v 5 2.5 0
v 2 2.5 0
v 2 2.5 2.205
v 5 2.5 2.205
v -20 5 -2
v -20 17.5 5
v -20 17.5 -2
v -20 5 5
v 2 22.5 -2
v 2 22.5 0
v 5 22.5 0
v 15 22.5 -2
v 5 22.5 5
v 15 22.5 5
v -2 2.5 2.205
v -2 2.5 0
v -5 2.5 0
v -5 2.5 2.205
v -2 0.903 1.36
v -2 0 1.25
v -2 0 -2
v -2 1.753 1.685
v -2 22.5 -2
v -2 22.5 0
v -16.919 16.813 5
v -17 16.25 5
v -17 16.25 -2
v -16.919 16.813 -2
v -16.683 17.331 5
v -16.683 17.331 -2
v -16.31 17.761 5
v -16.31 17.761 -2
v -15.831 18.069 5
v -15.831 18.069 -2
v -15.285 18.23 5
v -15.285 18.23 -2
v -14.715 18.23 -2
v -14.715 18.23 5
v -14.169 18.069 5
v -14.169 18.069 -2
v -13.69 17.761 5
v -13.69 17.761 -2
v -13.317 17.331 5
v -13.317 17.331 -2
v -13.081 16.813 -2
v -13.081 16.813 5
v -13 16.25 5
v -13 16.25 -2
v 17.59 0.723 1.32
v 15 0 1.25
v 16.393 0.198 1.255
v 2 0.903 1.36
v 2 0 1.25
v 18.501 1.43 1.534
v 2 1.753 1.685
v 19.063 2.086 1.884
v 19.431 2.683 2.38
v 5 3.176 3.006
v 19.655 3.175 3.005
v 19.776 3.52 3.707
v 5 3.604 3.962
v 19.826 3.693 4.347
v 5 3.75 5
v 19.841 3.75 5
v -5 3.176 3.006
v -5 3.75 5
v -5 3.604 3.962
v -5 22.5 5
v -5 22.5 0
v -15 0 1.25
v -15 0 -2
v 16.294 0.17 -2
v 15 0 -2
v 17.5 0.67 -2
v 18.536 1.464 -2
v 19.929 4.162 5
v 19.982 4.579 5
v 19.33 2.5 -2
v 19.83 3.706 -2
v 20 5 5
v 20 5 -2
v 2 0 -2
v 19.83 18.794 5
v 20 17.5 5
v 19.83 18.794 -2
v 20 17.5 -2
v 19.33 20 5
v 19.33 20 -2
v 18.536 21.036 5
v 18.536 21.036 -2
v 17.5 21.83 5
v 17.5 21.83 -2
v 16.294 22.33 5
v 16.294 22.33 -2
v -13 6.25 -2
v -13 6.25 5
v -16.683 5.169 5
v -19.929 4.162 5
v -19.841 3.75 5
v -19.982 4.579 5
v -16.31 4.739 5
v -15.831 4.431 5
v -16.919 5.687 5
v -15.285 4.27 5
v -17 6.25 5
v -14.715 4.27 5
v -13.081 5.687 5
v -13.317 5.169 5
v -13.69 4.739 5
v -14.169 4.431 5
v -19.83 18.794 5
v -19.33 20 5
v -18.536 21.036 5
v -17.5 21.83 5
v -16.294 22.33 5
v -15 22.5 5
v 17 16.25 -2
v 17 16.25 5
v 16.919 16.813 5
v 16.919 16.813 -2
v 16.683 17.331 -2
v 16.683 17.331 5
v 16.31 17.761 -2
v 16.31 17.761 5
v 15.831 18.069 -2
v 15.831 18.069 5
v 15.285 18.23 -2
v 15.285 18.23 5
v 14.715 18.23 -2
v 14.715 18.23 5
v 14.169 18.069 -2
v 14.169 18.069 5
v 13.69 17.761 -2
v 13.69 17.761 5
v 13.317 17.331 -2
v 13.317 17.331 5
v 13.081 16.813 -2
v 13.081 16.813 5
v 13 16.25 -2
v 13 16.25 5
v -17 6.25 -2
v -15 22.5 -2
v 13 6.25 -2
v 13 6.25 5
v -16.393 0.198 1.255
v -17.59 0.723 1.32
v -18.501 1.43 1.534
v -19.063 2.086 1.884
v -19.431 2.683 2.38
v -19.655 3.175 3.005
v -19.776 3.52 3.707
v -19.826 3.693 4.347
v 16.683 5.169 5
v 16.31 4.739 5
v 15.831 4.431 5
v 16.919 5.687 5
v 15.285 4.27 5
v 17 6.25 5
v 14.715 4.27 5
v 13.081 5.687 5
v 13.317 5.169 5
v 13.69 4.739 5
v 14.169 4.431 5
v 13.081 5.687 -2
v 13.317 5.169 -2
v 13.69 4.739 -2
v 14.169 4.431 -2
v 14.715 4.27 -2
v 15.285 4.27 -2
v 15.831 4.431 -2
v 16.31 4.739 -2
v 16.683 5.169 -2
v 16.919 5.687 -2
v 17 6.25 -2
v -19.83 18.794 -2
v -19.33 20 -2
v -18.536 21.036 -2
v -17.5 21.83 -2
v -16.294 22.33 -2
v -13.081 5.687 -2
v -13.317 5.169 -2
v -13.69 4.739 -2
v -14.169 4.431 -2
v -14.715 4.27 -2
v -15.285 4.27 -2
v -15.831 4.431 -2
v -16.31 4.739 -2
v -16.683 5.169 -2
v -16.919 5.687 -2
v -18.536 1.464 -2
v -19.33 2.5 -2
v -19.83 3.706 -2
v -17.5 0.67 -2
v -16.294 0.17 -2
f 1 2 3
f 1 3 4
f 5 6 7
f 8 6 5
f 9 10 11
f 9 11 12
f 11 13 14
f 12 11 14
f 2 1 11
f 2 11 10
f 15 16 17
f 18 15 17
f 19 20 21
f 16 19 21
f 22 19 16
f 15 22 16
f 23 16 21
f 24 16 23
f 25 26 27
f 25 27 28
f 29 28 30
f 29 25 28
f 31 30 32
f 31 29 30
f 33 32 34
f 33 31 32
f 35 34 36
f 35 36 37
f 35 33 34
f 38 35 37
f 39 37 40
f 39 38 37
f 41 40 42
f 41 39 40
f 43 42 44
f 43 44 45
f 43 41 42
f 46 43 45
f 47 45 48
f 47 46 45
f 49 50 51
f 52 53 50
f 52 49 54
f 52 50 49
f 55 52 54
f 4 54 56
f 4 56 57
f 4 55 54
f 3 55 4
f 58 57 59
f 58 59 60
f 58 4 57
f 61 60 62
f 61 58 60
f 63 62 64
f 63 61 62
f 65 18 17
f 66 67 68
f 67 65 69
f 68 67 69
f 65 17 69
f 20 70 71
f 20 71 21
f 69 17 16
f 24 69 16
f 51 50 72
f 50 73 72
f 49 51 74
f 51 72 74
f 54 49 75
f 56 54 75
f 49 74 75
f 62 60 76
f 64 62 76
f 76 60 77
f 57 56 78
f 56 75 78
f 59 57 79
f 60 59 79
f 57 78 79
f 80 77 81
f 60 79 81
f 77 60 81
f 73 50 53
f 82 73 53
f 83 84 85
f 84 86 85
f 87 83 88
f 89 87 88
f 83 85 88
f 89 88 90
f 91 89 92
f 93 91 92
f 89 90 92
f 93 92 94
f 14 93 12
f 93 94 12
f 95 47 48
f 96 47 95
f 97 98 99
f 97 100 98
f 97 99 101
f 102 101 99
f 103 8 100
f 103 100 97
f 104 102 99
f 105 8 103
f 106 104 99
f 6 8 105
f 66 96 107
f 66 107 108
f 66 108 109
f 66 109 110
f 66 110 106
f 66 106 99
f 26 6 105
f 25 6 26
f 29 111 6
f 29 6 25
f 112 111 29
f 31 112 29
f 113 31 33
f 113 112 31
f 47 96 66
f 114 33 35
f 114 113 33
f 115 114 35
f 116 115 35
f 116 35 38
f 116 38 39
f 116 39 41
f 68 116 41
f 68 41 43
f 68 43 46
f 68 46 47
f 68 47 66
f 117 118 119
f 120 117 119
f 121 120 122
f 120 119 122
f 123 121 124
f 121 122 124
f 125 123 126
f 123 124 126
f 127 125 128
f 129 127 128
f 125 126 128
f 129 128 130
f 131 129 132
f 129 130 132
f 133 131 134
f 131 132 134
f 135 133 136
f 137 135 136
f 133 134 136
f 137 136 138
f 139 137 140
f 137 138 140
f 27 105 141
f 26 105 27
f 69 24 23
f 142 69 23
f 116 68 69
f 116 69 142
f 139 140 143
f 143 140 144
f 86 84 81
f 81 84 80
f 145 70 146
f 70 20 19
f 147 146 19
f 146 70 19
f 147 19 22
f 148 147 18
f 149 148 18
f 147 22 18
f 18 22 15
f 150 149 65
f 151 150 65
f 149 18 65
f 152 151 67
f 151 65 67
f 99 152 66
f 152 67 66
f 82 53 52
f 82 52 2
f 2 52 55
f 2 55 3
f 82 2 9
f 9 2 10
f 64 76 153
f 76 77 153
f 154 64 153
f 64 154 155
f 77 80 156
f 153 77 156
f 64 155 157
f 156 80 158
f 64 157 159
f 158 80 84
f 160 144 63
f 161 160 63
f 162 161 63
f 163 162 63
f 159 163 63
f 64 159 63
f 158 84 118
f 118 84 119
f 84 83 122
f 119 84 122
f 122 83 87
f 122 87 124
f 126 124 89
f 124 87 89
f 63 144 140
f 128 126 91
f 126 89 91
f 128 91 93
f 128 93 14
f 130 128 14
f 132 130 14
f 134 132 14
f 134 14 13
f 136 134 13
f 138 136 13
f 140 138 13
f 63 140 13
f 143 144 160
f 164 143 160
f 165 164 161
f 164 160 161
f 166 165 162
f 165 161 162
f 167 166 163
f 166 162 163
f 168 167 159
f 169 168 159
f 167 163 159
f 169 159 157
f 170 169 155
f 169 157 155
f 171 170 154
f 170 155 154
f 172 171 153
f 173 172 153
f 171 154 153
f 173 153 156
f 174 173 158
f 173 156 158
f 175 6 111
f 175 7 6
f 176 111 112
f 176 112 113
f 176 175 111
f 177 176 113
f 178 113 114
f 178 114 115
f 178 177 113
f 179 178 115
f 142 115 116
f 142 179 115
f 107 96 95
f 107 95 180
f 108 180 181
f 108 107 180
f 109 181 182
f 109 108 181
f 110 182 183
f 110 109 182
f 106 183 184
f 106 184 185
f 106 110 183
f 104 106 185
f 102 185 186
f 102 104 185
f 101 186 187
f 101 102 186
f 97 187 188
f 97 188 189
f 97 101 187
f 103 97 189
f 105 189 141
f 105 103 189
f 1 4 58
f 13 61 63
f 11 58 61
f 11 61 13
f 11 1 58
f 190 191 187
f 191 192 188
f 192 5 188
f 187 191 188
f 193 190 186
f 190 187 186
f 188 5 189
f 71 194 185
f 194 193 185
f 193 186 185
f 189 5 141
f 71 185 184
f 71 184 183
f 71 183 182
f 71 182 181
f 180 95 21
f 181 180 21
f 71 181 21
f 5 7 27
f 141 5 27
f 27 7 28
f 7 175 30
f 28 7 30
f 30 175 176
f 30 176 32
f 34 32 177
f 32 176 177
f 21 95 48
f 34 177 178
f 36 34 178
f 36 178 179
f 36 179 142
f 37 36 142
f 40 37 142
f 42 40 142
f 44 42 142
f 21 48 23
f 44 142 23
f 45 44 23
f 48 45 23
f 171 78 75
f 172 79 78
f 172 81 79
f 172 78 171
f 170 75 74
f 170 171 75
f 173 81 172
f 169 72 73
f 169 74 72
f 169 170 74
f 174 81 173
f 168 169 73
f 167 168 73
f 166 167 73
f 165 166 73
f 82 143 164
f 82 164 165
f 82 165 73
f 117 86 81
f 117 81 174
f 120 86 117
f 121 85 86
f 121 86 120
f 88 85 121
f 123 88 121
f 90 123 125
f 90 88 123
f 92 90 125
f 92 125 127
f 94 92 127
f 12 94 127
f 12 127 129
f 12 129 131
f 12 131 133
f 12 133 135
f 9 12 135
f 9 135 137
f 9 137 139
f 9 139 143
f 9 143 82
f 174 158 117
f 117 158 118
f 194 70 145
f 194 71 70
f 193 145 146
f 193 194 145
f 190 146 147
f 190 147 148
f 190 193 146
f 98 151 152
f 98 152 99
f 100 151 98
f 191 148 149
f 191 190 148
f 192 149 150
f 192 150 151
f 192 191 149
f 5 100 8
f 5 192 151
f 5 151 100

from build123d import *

# Parameters (mm, degrees)
F1_DEPTH = 5
F0_W     = 3
F0_H     = 20
F2_DEPTH = 2
F3_R     = 3.75
F4_DEPTH = 25
F5_R     = 5


with BuildPart() as f1:
    # F0 (on Top) → F1 (new body)
    with BuildSketch(Plane.XY):
        Polygon((-20, 0), (-2, 0), (-2, 2.5), (-5, 2.5), (-5, 22.5), (-15, 22.5), (-20, 22.5), align=None)
        with BuildLine():
            ThreePointArc((-17, 16.25), (-15, 18.25), (-13, 16.25))
            Line((-13, 16.25), (-13, 6.25))
            ThreePointArc((-13, 6.25), (-15, 4.25), (-17, 6.25))
            Line((-17, 6.25), (-17, 16.25))
        make_face(mode=Mode.SUBTRACT)
    extrude(amount=F1_DEPTH)

    # F0 (on Top) → F2 (join)
    with BuildSketch(Plane.XY):
        Polygon((-20, 0), (-2, 0), (-2, 2.5), (-5, 2.5), (-5, 22.5), (-15, 22.5), (-20, 22.5), align=None)
        with BuildLine():
            ThreePointArc((-17, 16.25), (-15, 18.25), (-13, 16.25))
            Line((-13, 16.25), (-13, 6.25))
            ThreePointArc((-13, 6.25), (-15, 4.25), (-17, 6.25))
            Line((-17, 6.25), (-17, 16.25))
        make_face(mode=Mode.SUBTRACT)
        with Locations((-3.5, 12.5)):
            Rectangle(F0_W, F0_H)
    extrude(amount=-F2_DEPTH)

    # F3 (on face) → F4 (cut)
    with BuildSketch(Plane.YZ.offset(-2)):
        with Locations((0, 5)):
            Circle(F3_R)
    extrude(amount=-F4_DEPTH, mode=Mode.SUBTRACT)

    # F5
    f5_edges = [f1.edges().sort_by_distance(p)[0] for p in [
        (-20, 0, -0.375),
        (-20, 22.5, 1.5),
    ]]
    fillet(f5_edges, radius=F5_R)


with BuildPart() as f6_1:
    # F6: instance of F1
    add(f1.part.mirror(Plane.YZ))


solid = Compound([f1.part, f6_1.part])
